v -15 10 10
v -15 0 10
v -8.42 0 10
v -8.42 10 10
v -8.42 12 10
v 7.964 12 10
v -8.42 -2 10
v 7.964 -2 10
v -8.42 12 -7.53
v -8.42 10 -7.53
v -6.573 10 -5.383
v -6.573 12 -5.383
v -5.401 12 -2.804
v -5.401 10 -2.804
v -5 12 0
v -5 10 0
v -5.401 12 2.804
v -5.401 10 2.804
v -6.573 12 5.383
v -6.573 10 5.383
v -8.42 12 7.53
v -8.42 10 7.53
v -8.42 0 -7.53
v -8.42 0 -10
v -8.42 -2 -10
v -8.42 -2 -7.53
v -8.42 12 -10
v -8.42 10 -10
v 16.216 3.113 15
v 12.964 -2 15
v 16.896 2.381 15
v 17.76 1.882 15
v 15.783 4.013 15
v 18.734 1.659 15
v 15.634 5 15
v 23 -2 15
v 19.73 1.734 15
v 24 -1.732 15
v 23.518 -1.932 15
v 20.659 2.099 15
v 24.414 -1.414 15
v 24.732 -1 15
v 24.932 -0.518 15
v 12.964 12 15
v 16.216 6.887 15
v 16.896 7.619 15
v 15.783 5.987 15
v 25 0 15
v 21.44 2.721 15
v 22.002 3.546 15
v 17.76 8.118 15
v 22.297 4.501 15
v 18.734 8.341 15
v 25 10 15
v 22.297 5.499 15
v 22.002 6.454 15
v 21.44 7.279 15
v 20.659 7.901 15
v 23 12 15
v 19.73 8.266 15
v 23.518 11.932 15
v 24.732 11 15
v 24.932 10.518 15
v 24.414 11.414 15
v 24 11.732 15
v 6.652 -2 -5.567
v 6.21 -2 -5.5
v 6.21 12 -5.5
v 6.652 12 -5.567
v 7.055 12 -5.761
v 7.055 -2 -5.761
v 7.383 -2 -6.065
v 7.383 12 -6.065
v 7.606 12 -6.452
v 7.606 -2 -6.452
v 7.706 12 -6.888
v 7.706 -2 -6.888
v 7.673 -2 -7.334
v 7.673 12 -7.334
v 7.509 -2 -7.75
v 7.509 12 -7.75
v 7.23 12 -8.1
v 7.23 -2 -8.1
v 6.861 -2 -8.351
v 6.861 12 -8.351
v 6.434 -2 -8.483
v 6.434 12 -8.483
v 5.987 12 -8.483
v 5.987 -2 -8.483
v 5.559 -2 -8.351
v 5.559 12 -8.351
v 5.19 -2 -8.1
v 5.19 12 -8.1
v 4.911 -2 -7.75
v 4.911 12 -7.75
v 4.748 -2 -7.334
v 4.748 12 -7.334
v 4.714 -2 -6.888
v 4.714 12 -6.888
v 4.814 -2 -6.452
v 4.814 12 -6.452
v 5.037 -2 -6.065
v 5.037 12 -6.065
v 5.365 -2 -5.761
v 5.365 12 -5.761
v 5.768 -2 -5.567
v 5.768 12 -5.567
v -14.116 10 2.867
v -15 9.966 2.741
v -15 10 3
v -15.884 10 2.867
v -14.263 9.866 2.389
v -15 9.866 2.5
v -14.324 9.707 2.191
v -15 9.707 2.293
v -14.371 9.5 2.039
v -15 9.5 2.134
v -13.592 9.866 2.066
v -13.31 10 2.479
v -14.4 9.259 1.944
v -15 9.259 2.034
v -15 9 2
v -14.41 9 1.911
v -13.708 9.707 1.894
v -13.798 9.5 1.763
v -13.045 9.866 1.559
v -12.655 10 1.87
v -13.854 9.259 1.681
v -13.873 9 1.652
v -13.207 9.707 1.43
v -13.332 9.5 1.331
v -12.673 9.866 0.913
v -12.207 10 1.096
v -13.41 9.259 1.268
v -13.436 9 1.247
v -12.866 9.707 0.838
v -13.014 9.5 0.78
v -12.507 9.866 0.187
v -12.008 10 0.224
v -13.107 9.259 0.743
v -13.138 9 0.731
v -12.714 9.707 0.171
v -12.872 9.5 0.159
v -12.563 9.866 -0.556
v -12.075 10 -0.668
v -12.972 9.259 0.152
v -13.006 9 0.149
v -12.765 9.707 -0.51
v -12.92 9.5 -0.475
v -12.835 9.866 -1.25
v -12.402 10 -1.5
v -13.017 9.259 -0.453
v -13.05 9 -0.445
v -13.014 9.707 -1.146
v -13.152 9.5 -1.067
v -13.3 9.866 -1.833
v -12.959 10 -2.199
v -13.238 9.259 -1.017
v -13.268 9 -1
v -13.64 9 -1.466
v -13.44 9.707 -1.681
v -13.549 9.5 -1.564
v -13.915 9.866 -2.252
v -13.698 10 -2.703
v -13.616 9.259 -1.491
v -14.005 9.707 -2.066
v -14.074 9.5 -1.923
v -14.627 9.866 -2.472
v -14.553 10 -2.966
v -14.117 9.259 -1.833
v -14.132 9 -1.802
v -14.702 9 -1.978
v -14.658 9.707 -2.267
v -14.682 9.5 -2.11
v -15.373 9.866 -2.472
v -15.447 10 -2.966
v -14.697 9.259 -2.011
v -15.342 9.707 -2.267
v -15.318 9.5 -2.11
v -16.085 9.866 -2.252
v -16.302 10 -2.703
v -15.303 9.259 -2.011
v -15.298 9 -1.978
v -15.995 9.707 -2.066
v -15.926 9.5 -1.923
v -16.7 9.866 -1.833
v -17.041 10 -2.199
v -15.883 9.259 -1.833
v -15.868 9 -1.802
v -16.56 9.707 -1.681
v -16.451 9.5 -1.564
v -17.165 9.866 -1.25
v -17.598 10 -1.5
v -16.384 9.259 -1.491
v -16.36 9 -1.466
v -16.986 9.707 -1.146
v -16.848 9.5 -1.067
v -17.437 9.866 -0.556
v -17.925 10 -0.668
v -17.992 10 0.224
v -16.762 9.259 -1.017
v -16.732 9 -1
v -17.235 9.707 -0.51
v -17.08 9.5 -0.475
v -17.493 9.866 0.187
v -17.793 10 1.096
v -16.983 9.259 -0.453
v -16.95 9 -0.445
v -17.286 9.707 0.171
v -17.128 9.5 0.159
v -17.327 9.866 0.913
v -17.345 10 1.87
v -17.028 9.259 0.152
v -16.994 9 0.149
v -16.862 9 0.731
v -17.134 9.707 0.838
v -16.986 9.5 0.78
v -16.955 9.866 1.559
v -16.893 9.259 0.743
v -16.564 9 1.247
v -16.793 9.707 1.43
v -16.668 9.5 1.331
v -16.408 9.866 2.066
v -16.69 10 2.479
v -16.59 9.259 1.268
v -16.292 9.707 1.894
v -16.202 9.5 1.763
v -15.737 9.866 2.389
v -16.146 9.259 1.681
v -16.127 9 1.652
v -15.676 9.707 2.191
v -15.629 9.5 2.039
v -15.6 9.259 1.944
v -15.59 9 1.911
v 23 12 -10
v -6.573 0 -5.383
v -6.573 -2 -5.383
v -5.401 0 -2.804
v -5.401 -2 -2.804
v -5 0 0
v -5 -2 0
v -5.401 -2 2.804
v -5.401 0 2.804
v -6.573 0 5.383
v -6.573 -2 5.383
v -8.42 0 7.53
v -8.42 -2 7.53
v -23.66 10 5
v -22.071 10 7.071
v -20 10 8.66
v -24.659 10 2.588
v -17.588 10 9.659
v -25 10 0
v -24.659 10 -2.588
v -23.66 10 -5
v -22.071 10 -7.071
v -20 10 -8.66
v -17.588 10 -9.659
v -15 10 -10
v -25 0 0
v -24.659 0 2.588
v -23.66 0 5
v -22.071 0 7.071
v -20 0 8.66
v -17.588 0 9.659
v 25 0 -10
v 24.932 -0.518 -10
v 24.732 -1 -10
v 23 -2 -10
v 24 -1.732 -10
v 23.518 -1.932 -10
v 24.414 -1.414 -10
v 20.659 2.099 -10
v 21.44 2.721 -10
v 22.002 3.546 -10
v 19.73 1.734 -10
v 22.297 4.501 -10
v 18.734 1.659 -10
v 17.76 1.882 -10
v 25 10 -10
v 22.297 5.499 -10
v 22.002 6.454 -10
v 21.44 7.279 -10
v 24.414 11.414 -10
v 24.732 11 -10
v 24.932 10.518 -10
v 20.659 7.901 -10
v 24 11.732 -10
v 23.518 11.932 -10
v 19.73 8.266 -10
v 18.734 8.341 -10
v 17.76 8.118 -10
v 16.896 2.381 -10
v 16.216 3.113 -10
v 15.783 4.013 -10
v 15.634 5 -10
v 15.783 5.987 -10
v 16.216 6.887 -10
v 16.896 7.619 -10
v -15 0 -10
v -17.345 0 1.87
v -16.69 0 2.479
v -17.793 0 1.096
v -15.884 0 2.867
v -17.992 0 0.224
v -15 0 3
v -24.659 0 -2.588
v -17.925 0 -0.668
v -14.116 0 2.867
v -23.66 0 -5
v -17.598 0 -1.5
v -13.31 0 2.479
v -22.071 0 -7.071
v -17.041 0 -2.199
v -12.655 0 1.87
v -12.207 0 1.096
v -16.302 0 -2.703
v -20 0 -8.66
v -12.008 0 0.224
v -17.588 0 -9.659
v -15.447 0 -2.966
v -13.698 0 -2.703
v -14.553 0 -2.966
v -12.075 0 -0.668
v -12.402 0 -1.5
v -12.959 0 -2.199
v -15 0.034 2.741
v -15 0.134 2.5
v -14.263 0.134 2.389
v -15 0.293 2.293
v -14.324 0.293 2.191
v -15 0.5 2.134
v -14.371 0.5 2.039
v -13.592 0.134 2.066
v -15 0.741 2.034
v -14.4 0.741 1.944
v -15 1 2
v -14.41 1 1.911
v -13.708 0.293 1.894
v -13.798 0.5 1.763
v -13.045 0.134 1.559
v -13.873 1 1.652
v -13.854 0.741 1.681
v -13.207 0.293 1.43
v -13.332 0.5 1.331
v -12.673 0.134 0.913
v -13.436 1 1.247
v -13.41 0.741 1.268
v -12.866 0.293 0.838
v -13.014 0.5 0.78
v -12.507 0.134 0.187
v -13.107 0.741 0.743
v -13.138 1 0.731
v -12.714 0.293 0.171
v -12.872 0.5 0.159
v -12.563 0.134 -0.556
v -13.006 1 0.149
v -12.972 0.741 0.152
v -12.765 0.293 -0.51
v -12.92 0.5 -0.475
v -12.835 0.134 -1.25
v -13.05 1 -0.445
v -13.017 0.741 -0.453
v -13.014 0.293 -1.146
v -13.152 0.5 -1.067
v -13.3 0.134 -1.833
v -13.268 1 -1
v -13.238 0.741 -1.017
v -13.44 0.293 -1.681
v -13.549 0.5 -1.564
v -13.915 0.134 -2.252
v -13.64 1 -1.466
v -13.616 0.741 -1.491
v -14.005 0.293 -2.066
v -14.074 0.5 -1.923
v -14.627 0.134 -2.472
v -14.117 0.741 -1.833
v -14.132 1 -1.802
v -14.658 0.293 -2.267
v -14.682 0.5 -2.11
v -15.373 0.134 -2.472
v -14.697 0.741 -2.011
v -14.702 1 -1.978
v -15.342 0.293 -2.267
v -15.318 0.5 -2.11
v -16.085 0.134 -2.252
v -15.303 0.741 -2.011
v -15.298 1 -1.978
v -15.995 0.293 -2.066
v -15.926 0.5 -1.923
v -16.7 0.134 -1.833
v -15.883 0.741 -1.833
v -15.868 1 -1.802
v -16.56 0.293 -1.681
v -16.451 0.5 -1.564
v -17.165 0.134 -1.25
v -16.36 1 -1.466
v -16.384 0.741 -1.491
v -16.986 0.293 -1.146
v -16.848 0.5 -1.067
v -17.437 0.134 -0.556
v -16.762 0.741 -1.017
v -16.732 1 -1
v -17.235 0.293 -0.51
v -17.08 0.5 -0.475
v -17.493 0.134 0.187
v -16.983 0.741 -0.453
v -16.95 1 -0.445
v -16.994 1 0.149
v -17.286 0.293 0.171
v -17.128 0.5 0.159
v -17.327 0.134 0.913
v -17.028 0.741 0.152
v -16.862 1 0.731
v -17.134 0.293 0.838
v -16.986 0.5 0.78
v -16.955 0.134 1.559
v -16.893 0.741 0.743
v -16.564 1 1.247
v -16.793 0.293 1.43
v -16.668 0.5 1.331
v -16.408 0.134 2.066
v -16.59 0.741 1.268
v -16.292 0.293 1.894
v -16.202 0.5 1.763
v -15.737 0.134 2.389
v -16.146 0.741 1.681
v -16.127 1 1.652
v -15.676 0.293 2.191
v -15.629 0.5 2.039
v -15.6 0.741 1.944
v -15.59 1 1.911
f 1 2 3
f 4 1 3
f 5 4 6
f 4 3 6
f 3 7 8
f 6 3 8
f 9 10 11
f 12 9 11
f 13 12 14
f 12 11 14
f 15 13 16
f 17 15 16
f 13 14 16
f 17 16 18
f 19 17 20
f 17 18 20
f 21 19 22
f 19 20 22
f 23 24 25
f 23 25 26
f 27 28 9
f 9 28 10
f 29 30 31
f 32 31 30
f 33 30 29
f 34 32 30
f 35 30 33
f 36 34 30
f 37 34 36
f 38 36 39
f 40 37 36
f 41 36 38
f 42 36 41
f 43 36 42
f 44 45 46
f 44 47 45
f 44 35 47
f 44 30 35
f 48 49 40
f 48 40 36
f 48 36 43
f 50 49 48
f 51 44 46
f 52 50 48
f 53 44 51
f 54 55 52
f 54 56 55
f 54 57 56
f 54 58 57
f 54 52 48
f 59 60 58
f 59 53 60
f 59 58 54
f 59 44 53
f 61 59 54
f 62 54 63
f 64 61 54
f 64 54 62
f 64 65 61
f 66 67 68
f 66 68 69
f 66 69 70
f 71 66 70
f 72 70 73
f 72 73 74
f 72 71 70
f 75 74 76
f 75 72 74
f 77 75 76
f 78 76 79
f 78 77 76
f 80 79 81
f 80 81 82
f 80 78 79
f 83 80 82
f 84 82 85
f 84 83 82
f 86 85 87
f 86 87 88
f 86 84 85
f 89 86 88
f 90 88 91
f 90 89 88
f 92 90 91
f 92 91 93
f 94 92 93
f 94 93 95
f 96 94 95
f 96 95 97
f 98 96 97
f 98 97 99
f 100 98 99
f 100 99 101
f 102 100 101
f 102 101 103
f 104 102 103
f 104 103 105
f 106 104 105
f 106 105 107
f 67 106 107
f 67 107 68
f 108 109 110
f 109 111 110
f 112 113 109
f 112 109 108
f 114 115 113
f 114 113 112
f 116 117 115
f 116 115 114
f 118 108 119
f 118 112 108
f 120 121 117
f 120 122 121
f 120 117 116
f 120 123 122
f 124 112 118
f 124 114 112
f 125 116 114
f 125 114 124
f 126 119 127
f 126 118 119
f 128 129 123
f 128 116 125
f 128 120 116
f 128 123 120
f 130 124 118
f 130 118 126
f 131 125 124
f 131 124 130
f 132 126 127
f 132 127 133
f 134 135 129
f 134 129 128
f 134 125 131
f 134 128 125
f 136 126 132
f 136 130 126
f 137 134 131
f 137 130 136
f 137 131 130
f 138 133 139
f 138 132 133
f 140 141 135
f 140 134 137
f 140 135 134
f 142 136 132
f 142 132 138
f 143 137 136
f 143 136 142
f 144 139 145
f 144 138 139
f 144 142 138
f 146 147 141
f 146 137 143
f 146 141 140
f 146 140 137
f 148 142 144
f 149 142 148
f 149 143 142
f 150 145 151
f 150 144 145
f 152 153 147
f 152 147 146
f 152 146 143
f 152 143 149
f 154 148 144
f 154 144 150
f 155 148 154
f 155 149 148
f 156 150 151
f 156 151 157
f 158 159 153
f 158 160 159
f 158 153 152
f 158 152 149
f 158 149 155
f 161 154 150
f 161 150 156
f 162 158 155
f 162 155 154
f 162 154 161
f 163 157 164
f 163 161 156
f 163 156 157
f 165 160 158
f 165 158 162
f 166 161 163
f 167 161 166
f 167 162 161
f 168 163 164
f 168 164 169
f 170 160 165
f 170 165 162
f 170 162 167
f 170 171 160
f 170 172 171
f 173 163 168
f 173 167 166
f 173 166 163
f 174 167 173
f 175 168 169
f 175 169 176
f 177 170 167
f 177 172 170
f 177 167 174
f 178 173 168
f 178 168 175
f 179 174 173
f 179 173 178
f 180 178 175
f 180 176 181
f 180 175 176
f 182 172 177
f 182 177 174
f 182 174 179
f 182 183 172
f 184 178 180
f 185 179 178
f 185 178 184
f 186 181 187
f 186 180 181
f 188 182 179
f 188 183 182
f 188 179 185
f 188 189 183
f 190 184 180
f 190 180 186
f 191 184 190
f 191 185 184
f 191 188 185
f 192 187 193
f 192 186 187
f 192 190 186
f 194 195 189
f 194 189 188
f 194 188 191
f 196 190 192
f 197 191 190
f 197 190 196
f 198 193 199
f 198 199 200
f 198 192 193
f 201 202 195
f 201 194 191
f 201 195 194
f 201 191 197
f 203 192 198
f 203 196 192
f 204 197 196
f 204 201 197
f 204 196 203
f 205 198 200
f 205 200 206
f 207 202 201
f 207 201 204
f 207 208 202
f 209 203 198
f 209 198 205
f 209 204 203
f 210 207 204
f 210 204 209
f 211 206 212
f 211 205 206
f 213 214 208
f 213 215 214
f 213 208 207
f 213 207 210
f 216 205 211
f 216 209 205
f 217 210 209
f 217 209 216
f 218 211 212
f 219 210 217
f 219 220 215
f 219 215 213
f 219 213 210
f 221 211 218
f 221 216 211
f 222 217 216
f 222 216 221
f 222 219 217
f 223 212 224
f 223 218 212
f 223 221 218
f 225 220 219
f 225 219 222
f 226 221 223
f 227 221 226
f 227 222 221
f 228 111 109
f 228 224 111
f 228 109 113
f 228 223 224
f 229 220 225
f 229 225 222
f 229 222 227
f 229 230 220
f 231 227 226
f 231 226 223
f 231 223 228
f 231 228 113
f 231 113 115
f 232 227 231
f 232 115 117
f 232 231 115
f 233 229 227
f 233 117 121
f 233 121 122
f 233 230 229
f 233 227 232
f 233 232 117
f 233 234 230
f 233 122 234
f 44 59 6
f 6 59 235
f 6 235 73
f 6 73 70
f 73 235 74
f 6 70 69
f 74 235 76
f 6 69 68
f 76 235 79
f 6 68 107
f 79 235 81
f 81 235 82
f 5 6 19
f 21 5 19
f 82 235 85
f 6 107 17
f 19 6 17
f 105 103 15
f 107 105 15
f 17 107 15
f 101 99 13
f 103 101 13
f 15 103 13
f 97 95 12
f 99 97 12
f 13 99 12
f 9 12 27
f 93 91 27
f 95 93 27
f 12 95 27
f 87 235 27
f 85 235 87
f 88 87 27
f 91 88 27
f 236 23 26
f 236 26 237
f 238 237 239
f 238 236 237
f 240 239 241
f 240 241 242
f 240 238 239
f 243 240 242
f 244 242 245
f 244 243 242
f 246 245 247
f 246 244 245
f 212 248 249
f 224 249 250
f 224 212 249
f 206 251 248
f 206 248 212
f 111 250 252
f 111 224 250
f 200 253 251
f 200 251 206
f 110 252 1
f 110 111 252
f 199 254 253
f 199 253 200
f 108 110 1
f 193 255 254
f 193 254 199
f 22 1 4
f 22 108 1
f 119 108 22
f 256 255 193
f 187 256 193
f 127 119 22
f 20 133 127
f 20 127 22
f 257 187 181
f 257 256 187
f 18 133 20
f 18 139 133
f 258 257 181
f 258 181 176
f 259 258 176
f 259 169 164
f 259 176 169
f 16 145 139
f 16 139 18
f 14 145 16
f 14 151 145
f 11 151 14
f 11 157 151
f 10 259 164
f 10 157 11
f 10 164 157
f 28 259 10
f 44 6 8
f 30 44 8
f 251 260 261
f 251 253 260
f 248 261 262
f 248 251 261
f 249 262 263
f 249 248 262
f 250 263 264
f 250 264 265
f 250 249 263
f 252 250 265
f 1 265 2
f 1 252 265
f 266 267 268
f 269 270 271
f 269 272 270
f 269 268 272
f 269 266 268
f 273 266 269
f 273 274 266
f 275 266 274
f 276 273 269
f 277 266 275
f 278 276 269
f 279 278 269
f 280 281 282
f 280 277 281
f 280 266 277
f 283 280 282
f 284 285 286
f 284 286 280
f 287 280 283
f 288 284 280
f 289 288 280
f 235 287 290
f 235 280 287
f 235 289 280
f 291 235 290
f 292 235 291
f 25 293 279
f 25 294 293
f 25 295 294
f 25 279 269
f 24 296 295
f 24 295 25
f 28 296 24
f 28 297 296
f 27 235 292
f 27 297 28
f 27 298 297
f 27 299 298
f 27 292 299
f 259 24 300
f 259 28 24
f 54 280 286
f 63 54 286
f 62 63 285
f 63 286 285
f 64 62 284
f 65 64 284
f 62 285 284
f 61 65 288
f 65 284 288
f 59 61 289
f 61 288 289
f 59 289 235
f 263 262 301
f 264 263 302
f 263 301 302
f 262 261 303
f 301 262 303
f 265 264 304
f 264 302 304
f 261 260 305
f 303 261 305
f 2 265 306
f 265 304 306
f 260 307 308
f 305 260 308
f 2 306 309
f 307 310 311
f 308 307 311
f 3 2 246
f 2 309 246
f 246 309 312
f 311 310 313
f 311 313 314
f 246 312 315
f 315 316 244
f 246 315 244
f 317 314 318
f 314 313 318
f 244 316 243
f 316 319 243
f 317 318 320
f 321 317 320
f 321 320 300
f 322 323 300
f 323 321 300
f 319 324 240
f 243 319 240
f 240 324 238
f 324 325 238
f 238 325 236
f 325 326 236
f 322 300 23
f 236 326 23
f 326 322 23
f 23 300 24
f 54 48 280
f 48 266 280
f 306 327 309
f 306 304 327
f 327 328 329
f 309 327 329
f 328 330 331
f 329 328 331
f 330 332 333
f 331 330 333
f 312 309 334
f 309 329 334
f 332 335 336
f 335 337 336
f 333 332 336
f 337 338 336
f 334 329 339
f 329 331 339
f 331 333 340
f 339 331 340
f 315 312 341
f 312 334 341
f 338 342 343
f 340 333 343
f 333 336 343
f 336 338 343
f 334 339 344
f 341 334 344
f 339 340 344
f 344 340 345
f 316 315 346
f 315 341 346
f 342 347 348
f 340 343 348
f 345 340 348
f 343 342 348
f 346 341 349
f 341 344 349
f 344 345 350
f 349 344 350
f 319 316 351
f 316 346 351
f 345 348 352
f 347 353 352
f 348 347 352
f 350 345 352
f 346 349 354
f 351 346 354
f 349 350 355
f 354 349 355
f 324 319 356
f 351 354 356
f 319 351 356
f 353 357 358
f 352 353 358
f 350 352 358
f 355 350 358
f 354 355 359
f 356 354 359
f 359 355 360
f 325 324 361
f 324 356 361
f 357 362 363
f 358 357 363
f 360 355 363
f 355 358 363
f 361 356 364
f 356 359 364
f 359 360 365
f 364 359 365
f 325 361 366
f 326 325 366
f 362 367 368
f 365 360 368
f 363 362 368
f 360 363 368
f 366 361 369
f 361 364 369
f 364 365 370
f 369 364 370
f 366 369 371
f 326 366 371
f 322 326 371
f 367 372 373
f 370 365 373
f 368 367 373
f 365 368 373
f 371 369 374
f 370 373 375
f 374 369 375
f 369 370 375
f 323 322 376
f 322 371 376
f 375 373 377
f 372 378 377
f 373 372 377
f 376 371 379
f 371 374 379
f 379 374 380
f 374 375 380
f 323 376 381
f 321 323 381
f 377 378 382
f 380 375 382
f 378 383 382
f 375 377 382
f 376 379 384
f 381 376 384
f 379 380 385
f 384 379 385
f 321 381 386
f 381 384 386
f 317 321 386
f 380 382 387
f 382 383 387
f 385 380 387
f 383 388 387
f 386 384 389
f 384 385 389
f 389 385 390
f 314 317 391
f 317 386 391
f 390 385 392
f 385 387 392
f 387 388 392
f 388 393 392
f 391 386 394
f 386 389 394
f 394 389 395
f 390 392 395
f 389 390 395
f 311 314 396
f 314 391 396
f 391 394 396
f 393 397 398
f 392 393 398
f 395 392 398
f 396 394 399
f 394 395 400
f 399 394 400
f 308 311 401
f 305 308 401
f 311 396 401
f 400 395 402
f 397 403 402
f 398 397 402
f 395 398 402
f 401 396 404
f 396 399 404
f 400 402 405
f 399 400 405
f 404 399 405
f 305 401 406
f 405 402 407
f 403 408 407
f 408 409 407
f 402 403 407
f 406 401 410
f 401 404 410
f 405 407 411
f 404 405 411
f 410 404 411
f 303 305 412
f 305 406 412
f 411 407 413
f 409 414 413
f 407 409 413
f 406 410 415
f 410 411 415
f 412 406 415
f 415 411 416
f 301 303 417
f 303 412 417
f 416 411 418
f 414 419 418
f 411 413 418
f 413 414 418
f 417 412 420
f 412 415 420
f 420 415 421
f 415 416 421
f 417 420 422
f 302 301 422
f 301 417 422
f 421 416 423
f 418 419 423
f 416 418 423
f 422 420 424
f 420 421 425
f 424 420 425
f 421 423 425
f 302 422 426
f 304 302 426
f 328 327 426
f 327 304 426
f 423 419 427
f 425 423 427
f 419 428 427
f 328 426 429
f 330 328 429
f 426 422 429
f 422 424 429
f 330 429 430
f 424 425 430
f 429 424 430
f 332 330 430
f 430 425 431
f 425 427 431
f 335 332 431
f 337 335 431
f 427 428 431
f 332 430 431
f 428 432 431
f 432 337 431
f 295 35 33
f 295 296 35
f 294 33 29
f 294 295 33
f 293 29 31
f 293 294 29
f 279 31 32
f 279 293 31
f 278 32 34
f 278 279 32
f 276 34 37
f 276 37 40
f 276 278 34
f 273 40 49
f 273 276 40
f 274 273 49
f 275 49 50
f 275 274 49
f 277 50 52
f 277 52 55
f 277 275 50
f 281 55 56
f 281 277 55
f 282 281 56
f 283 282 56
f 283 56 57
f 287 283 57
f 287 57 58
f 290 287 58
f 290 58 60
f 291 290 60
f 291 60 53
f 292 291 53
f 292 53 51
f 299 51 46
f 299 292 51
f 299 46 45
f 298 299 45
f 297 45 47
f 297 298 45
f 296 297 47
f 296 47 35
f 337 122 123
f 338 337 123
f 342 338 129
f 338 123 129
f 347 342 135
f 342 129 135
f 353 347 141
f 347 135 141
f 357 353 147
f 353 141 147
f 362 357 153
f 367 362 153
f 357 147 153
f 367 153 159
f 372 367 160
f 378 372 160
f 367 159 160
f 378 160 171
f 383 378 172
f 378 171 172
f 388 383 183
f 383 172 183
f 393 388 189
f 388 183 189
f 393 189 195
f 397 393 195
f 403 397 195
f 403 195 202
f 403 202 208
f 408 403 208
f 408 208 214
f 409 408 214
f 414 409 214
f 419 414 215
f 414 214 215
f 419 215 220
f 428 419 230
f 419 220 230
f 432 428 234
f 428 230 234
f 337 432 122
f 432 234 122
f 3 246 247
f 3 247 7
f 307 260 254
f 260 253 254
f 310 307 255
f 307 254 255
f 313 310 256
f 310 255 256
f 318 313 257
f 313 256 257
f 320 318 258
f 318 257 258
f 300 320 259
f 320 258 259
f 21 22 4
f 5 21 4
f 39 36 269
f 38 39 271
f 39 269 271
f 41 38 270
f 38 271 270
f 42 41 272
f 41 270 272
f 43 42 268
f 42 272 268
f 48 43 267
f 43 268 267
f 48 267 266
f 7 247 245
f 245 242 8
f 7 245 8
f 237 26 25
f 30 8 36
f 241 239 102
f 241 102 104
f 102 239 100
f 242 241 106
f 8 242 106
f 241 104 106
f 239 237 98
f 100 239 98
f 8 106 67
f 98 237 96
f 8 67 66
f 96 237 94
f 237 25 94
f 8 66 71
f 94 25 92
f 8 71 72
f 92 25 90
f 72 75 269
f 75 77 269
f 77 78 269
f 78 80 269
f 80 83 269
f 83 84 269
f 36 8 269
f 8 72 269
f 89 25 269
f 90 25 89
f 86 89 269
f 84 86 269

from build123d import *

# Parameters (mm, degrees)
SKETCH1_W           = 50
SKETCH1_H           = 20
BOSS_EXTRUDE1_DEPTH = 10
FILLET1_R           = 10
SKETCH2_R           = 2
CUT_EXTRUDE1_DEPTH  = 10
SKETCH4_R           = 3.35
CUT_EXTRUDE2_DEPTH  = 40
BOSS_EXTRUDE3_DEPTH = 2
SKETCH7_R           = 1.5
CUT_EXTRUDE3_DEPTH  = 20
FILLET3_R           = 2
FILLET4_R           = 1
SKETCH8_R           = 3.35
BOSS_EXTRUDE4_DEPTH = 5
CHAMFER1_SIZE       = 5


with BuildPart() as part:
    # Sketch1 → Boss-Extrude1 (new body)
    with BuildSketch(Plane(origin=(0, 0, 0), x_dir=(1, 0, 0), z_dir=(0, 1, 0))):
        Rectangle(SKETCH1_W, SKETCH1_H)
    extrude(amount=BOSS_EXTRUDE1_DEPTH)

    # Fillet1
    fillet1_edges = [part.edges().sort_by_distance(p)[0] for p in [
        (-25, 5, 10),
        (-25, 5, -10),
    ]]
    fillet(fillet1_edges, radius=FILLET1_R - 0.0001)  # a hair under: the kernel refuses the full size

    # Sketch2 → Cut-Extrude1 (cut)
    with BuildSketch(Plane(origin=(0, 10, 0), x_dir=(1, 0, 0), z_dir=(0, 1, 0))):
        with Locations(Location((-15, 0, 0), (0, 0, 270))):
            Circle(SKETCH2_R)
    extrude(amount=-CUT_EXTRUDE1_DEPTH, mode=Mode.SUBTRACT)

    # Sketch4 → Cut-Extrude2 (cut)
    with BuildSketch(Plane(origin=(0, 0, -10), x_dir=(-1, 0, 0), z_dir=(0, 0, -1))):
        with Locations((-18.984247751, 5)):
            Circle(SKETCH4_R)
    extrude(amount=-CUT_EXTRUDE2_DEPTH, mode=Mode.SUBTRACT)

    # Sketch6 → Boss-Extrude3 (add)
    with BuildSketch(Plane(origin=(0, 10, 0), x_dir=(1, 0, 0), z_dir=(0, 1, 0))):
        with BuildLine():
            Line((-8.420233762, 10), (-8.420233762, 7.53038354))
            ThreePointArc((-8.420233762, 7.53038354), (-5, 0), (-8.420233762, -7.53038354))
            Line((-8.420233762, -7.53038354), (-8.420233762, -10))
            Line((-8.420233762, -10), (25, -10))
            Line((25, -10), (25, 10))
            Line((25, 10), (-8.420233762, 10))
        make_face()
    boss_extrude3 = extrude(amount=BOSS_EXTRUDE3_DEPTH)

    # Sketch7 → Cut-Extrude3 (cut)
    with BuildSketch(Plane(origin=(0, 12, 0), x_dir=(1, 0, 0), z_dir=(0, 1, 0))):
        with Locations(Location((6.210160934, 7, 0), (0, 0, 270))):
            Circle(SKETCH7_R)
    cut_extrude3 = extrude(amount=-CUT_EXTRUDE3_DEPTH, mode=Mode.SUBTRACT)

    # Mirror3: Boss-Extrude3, Cut-Extrude3 across plane
    add(boss_extrude3.mirror(Plane(origin=(0, 5, 0), x_dir=(0, 0, 1), z_dir=(0, -1, 0))))
    add(cut_extrude3.mirror(Plane(origin=(0, 5, 0), x_dir=(0, 0, 1), z_dir=(0, -1, 0))), mode=Mode.SUBTRACT)

    # Fillet3
    fillet3_edges = [part.edges().sort_by_distance(p)[0] for p in [
        (25, 12, 0),
        (25, -2, 0),
    ]]
    fillet(fillet3_edges, radius=FILLET3_R)

    # Fillet4
    fillet4_edges = [part.edges().sort_by_distance(p)[0] for p in [
        (-15, 0, -2),
        (-15, 10, -2),
    ]]
    fillet(fillet4_edges, radius=FILLET4_R)

    # Sketch8 → Boss-Extrude4 (add)
    with BuildSketch(Plane.XY.offset(10)):
        with BuildLine():
            Line((12.964247751, 12), (12.964247751, -2))
            Line((12.964247751, -2), (23, -2))
            ThreePointArc((23, -2), (24.414213562, -1.414213562), (25, 0))
            Line((25, 0), (25, 10))
            ThreePointArc((25, 10), (24.414213562, 11.414213562), (23, 12))
            Line((23, 12), (12.964247751, 12))
        make_face()
        with Locations(Location((18.984247751, 5, 0), (0, 0, 180))):
            Circle(SKETCH8_R, mode=Mode.SUBTRACT)
    extrude(amount=BOSS_EXTRUDE4_DEPTH)

    # Chamfer1
    chamfer1_edges = [part.edges().sort_by_distance(p)[0] for p in [
        (12.964247751, 5, 10),
    ]]
    chamfer(chamfer1_edges, length=CHAMFER1_SIZE - 0.0001)  # a hair under: the kernel refuses the full size


solid = part.part
